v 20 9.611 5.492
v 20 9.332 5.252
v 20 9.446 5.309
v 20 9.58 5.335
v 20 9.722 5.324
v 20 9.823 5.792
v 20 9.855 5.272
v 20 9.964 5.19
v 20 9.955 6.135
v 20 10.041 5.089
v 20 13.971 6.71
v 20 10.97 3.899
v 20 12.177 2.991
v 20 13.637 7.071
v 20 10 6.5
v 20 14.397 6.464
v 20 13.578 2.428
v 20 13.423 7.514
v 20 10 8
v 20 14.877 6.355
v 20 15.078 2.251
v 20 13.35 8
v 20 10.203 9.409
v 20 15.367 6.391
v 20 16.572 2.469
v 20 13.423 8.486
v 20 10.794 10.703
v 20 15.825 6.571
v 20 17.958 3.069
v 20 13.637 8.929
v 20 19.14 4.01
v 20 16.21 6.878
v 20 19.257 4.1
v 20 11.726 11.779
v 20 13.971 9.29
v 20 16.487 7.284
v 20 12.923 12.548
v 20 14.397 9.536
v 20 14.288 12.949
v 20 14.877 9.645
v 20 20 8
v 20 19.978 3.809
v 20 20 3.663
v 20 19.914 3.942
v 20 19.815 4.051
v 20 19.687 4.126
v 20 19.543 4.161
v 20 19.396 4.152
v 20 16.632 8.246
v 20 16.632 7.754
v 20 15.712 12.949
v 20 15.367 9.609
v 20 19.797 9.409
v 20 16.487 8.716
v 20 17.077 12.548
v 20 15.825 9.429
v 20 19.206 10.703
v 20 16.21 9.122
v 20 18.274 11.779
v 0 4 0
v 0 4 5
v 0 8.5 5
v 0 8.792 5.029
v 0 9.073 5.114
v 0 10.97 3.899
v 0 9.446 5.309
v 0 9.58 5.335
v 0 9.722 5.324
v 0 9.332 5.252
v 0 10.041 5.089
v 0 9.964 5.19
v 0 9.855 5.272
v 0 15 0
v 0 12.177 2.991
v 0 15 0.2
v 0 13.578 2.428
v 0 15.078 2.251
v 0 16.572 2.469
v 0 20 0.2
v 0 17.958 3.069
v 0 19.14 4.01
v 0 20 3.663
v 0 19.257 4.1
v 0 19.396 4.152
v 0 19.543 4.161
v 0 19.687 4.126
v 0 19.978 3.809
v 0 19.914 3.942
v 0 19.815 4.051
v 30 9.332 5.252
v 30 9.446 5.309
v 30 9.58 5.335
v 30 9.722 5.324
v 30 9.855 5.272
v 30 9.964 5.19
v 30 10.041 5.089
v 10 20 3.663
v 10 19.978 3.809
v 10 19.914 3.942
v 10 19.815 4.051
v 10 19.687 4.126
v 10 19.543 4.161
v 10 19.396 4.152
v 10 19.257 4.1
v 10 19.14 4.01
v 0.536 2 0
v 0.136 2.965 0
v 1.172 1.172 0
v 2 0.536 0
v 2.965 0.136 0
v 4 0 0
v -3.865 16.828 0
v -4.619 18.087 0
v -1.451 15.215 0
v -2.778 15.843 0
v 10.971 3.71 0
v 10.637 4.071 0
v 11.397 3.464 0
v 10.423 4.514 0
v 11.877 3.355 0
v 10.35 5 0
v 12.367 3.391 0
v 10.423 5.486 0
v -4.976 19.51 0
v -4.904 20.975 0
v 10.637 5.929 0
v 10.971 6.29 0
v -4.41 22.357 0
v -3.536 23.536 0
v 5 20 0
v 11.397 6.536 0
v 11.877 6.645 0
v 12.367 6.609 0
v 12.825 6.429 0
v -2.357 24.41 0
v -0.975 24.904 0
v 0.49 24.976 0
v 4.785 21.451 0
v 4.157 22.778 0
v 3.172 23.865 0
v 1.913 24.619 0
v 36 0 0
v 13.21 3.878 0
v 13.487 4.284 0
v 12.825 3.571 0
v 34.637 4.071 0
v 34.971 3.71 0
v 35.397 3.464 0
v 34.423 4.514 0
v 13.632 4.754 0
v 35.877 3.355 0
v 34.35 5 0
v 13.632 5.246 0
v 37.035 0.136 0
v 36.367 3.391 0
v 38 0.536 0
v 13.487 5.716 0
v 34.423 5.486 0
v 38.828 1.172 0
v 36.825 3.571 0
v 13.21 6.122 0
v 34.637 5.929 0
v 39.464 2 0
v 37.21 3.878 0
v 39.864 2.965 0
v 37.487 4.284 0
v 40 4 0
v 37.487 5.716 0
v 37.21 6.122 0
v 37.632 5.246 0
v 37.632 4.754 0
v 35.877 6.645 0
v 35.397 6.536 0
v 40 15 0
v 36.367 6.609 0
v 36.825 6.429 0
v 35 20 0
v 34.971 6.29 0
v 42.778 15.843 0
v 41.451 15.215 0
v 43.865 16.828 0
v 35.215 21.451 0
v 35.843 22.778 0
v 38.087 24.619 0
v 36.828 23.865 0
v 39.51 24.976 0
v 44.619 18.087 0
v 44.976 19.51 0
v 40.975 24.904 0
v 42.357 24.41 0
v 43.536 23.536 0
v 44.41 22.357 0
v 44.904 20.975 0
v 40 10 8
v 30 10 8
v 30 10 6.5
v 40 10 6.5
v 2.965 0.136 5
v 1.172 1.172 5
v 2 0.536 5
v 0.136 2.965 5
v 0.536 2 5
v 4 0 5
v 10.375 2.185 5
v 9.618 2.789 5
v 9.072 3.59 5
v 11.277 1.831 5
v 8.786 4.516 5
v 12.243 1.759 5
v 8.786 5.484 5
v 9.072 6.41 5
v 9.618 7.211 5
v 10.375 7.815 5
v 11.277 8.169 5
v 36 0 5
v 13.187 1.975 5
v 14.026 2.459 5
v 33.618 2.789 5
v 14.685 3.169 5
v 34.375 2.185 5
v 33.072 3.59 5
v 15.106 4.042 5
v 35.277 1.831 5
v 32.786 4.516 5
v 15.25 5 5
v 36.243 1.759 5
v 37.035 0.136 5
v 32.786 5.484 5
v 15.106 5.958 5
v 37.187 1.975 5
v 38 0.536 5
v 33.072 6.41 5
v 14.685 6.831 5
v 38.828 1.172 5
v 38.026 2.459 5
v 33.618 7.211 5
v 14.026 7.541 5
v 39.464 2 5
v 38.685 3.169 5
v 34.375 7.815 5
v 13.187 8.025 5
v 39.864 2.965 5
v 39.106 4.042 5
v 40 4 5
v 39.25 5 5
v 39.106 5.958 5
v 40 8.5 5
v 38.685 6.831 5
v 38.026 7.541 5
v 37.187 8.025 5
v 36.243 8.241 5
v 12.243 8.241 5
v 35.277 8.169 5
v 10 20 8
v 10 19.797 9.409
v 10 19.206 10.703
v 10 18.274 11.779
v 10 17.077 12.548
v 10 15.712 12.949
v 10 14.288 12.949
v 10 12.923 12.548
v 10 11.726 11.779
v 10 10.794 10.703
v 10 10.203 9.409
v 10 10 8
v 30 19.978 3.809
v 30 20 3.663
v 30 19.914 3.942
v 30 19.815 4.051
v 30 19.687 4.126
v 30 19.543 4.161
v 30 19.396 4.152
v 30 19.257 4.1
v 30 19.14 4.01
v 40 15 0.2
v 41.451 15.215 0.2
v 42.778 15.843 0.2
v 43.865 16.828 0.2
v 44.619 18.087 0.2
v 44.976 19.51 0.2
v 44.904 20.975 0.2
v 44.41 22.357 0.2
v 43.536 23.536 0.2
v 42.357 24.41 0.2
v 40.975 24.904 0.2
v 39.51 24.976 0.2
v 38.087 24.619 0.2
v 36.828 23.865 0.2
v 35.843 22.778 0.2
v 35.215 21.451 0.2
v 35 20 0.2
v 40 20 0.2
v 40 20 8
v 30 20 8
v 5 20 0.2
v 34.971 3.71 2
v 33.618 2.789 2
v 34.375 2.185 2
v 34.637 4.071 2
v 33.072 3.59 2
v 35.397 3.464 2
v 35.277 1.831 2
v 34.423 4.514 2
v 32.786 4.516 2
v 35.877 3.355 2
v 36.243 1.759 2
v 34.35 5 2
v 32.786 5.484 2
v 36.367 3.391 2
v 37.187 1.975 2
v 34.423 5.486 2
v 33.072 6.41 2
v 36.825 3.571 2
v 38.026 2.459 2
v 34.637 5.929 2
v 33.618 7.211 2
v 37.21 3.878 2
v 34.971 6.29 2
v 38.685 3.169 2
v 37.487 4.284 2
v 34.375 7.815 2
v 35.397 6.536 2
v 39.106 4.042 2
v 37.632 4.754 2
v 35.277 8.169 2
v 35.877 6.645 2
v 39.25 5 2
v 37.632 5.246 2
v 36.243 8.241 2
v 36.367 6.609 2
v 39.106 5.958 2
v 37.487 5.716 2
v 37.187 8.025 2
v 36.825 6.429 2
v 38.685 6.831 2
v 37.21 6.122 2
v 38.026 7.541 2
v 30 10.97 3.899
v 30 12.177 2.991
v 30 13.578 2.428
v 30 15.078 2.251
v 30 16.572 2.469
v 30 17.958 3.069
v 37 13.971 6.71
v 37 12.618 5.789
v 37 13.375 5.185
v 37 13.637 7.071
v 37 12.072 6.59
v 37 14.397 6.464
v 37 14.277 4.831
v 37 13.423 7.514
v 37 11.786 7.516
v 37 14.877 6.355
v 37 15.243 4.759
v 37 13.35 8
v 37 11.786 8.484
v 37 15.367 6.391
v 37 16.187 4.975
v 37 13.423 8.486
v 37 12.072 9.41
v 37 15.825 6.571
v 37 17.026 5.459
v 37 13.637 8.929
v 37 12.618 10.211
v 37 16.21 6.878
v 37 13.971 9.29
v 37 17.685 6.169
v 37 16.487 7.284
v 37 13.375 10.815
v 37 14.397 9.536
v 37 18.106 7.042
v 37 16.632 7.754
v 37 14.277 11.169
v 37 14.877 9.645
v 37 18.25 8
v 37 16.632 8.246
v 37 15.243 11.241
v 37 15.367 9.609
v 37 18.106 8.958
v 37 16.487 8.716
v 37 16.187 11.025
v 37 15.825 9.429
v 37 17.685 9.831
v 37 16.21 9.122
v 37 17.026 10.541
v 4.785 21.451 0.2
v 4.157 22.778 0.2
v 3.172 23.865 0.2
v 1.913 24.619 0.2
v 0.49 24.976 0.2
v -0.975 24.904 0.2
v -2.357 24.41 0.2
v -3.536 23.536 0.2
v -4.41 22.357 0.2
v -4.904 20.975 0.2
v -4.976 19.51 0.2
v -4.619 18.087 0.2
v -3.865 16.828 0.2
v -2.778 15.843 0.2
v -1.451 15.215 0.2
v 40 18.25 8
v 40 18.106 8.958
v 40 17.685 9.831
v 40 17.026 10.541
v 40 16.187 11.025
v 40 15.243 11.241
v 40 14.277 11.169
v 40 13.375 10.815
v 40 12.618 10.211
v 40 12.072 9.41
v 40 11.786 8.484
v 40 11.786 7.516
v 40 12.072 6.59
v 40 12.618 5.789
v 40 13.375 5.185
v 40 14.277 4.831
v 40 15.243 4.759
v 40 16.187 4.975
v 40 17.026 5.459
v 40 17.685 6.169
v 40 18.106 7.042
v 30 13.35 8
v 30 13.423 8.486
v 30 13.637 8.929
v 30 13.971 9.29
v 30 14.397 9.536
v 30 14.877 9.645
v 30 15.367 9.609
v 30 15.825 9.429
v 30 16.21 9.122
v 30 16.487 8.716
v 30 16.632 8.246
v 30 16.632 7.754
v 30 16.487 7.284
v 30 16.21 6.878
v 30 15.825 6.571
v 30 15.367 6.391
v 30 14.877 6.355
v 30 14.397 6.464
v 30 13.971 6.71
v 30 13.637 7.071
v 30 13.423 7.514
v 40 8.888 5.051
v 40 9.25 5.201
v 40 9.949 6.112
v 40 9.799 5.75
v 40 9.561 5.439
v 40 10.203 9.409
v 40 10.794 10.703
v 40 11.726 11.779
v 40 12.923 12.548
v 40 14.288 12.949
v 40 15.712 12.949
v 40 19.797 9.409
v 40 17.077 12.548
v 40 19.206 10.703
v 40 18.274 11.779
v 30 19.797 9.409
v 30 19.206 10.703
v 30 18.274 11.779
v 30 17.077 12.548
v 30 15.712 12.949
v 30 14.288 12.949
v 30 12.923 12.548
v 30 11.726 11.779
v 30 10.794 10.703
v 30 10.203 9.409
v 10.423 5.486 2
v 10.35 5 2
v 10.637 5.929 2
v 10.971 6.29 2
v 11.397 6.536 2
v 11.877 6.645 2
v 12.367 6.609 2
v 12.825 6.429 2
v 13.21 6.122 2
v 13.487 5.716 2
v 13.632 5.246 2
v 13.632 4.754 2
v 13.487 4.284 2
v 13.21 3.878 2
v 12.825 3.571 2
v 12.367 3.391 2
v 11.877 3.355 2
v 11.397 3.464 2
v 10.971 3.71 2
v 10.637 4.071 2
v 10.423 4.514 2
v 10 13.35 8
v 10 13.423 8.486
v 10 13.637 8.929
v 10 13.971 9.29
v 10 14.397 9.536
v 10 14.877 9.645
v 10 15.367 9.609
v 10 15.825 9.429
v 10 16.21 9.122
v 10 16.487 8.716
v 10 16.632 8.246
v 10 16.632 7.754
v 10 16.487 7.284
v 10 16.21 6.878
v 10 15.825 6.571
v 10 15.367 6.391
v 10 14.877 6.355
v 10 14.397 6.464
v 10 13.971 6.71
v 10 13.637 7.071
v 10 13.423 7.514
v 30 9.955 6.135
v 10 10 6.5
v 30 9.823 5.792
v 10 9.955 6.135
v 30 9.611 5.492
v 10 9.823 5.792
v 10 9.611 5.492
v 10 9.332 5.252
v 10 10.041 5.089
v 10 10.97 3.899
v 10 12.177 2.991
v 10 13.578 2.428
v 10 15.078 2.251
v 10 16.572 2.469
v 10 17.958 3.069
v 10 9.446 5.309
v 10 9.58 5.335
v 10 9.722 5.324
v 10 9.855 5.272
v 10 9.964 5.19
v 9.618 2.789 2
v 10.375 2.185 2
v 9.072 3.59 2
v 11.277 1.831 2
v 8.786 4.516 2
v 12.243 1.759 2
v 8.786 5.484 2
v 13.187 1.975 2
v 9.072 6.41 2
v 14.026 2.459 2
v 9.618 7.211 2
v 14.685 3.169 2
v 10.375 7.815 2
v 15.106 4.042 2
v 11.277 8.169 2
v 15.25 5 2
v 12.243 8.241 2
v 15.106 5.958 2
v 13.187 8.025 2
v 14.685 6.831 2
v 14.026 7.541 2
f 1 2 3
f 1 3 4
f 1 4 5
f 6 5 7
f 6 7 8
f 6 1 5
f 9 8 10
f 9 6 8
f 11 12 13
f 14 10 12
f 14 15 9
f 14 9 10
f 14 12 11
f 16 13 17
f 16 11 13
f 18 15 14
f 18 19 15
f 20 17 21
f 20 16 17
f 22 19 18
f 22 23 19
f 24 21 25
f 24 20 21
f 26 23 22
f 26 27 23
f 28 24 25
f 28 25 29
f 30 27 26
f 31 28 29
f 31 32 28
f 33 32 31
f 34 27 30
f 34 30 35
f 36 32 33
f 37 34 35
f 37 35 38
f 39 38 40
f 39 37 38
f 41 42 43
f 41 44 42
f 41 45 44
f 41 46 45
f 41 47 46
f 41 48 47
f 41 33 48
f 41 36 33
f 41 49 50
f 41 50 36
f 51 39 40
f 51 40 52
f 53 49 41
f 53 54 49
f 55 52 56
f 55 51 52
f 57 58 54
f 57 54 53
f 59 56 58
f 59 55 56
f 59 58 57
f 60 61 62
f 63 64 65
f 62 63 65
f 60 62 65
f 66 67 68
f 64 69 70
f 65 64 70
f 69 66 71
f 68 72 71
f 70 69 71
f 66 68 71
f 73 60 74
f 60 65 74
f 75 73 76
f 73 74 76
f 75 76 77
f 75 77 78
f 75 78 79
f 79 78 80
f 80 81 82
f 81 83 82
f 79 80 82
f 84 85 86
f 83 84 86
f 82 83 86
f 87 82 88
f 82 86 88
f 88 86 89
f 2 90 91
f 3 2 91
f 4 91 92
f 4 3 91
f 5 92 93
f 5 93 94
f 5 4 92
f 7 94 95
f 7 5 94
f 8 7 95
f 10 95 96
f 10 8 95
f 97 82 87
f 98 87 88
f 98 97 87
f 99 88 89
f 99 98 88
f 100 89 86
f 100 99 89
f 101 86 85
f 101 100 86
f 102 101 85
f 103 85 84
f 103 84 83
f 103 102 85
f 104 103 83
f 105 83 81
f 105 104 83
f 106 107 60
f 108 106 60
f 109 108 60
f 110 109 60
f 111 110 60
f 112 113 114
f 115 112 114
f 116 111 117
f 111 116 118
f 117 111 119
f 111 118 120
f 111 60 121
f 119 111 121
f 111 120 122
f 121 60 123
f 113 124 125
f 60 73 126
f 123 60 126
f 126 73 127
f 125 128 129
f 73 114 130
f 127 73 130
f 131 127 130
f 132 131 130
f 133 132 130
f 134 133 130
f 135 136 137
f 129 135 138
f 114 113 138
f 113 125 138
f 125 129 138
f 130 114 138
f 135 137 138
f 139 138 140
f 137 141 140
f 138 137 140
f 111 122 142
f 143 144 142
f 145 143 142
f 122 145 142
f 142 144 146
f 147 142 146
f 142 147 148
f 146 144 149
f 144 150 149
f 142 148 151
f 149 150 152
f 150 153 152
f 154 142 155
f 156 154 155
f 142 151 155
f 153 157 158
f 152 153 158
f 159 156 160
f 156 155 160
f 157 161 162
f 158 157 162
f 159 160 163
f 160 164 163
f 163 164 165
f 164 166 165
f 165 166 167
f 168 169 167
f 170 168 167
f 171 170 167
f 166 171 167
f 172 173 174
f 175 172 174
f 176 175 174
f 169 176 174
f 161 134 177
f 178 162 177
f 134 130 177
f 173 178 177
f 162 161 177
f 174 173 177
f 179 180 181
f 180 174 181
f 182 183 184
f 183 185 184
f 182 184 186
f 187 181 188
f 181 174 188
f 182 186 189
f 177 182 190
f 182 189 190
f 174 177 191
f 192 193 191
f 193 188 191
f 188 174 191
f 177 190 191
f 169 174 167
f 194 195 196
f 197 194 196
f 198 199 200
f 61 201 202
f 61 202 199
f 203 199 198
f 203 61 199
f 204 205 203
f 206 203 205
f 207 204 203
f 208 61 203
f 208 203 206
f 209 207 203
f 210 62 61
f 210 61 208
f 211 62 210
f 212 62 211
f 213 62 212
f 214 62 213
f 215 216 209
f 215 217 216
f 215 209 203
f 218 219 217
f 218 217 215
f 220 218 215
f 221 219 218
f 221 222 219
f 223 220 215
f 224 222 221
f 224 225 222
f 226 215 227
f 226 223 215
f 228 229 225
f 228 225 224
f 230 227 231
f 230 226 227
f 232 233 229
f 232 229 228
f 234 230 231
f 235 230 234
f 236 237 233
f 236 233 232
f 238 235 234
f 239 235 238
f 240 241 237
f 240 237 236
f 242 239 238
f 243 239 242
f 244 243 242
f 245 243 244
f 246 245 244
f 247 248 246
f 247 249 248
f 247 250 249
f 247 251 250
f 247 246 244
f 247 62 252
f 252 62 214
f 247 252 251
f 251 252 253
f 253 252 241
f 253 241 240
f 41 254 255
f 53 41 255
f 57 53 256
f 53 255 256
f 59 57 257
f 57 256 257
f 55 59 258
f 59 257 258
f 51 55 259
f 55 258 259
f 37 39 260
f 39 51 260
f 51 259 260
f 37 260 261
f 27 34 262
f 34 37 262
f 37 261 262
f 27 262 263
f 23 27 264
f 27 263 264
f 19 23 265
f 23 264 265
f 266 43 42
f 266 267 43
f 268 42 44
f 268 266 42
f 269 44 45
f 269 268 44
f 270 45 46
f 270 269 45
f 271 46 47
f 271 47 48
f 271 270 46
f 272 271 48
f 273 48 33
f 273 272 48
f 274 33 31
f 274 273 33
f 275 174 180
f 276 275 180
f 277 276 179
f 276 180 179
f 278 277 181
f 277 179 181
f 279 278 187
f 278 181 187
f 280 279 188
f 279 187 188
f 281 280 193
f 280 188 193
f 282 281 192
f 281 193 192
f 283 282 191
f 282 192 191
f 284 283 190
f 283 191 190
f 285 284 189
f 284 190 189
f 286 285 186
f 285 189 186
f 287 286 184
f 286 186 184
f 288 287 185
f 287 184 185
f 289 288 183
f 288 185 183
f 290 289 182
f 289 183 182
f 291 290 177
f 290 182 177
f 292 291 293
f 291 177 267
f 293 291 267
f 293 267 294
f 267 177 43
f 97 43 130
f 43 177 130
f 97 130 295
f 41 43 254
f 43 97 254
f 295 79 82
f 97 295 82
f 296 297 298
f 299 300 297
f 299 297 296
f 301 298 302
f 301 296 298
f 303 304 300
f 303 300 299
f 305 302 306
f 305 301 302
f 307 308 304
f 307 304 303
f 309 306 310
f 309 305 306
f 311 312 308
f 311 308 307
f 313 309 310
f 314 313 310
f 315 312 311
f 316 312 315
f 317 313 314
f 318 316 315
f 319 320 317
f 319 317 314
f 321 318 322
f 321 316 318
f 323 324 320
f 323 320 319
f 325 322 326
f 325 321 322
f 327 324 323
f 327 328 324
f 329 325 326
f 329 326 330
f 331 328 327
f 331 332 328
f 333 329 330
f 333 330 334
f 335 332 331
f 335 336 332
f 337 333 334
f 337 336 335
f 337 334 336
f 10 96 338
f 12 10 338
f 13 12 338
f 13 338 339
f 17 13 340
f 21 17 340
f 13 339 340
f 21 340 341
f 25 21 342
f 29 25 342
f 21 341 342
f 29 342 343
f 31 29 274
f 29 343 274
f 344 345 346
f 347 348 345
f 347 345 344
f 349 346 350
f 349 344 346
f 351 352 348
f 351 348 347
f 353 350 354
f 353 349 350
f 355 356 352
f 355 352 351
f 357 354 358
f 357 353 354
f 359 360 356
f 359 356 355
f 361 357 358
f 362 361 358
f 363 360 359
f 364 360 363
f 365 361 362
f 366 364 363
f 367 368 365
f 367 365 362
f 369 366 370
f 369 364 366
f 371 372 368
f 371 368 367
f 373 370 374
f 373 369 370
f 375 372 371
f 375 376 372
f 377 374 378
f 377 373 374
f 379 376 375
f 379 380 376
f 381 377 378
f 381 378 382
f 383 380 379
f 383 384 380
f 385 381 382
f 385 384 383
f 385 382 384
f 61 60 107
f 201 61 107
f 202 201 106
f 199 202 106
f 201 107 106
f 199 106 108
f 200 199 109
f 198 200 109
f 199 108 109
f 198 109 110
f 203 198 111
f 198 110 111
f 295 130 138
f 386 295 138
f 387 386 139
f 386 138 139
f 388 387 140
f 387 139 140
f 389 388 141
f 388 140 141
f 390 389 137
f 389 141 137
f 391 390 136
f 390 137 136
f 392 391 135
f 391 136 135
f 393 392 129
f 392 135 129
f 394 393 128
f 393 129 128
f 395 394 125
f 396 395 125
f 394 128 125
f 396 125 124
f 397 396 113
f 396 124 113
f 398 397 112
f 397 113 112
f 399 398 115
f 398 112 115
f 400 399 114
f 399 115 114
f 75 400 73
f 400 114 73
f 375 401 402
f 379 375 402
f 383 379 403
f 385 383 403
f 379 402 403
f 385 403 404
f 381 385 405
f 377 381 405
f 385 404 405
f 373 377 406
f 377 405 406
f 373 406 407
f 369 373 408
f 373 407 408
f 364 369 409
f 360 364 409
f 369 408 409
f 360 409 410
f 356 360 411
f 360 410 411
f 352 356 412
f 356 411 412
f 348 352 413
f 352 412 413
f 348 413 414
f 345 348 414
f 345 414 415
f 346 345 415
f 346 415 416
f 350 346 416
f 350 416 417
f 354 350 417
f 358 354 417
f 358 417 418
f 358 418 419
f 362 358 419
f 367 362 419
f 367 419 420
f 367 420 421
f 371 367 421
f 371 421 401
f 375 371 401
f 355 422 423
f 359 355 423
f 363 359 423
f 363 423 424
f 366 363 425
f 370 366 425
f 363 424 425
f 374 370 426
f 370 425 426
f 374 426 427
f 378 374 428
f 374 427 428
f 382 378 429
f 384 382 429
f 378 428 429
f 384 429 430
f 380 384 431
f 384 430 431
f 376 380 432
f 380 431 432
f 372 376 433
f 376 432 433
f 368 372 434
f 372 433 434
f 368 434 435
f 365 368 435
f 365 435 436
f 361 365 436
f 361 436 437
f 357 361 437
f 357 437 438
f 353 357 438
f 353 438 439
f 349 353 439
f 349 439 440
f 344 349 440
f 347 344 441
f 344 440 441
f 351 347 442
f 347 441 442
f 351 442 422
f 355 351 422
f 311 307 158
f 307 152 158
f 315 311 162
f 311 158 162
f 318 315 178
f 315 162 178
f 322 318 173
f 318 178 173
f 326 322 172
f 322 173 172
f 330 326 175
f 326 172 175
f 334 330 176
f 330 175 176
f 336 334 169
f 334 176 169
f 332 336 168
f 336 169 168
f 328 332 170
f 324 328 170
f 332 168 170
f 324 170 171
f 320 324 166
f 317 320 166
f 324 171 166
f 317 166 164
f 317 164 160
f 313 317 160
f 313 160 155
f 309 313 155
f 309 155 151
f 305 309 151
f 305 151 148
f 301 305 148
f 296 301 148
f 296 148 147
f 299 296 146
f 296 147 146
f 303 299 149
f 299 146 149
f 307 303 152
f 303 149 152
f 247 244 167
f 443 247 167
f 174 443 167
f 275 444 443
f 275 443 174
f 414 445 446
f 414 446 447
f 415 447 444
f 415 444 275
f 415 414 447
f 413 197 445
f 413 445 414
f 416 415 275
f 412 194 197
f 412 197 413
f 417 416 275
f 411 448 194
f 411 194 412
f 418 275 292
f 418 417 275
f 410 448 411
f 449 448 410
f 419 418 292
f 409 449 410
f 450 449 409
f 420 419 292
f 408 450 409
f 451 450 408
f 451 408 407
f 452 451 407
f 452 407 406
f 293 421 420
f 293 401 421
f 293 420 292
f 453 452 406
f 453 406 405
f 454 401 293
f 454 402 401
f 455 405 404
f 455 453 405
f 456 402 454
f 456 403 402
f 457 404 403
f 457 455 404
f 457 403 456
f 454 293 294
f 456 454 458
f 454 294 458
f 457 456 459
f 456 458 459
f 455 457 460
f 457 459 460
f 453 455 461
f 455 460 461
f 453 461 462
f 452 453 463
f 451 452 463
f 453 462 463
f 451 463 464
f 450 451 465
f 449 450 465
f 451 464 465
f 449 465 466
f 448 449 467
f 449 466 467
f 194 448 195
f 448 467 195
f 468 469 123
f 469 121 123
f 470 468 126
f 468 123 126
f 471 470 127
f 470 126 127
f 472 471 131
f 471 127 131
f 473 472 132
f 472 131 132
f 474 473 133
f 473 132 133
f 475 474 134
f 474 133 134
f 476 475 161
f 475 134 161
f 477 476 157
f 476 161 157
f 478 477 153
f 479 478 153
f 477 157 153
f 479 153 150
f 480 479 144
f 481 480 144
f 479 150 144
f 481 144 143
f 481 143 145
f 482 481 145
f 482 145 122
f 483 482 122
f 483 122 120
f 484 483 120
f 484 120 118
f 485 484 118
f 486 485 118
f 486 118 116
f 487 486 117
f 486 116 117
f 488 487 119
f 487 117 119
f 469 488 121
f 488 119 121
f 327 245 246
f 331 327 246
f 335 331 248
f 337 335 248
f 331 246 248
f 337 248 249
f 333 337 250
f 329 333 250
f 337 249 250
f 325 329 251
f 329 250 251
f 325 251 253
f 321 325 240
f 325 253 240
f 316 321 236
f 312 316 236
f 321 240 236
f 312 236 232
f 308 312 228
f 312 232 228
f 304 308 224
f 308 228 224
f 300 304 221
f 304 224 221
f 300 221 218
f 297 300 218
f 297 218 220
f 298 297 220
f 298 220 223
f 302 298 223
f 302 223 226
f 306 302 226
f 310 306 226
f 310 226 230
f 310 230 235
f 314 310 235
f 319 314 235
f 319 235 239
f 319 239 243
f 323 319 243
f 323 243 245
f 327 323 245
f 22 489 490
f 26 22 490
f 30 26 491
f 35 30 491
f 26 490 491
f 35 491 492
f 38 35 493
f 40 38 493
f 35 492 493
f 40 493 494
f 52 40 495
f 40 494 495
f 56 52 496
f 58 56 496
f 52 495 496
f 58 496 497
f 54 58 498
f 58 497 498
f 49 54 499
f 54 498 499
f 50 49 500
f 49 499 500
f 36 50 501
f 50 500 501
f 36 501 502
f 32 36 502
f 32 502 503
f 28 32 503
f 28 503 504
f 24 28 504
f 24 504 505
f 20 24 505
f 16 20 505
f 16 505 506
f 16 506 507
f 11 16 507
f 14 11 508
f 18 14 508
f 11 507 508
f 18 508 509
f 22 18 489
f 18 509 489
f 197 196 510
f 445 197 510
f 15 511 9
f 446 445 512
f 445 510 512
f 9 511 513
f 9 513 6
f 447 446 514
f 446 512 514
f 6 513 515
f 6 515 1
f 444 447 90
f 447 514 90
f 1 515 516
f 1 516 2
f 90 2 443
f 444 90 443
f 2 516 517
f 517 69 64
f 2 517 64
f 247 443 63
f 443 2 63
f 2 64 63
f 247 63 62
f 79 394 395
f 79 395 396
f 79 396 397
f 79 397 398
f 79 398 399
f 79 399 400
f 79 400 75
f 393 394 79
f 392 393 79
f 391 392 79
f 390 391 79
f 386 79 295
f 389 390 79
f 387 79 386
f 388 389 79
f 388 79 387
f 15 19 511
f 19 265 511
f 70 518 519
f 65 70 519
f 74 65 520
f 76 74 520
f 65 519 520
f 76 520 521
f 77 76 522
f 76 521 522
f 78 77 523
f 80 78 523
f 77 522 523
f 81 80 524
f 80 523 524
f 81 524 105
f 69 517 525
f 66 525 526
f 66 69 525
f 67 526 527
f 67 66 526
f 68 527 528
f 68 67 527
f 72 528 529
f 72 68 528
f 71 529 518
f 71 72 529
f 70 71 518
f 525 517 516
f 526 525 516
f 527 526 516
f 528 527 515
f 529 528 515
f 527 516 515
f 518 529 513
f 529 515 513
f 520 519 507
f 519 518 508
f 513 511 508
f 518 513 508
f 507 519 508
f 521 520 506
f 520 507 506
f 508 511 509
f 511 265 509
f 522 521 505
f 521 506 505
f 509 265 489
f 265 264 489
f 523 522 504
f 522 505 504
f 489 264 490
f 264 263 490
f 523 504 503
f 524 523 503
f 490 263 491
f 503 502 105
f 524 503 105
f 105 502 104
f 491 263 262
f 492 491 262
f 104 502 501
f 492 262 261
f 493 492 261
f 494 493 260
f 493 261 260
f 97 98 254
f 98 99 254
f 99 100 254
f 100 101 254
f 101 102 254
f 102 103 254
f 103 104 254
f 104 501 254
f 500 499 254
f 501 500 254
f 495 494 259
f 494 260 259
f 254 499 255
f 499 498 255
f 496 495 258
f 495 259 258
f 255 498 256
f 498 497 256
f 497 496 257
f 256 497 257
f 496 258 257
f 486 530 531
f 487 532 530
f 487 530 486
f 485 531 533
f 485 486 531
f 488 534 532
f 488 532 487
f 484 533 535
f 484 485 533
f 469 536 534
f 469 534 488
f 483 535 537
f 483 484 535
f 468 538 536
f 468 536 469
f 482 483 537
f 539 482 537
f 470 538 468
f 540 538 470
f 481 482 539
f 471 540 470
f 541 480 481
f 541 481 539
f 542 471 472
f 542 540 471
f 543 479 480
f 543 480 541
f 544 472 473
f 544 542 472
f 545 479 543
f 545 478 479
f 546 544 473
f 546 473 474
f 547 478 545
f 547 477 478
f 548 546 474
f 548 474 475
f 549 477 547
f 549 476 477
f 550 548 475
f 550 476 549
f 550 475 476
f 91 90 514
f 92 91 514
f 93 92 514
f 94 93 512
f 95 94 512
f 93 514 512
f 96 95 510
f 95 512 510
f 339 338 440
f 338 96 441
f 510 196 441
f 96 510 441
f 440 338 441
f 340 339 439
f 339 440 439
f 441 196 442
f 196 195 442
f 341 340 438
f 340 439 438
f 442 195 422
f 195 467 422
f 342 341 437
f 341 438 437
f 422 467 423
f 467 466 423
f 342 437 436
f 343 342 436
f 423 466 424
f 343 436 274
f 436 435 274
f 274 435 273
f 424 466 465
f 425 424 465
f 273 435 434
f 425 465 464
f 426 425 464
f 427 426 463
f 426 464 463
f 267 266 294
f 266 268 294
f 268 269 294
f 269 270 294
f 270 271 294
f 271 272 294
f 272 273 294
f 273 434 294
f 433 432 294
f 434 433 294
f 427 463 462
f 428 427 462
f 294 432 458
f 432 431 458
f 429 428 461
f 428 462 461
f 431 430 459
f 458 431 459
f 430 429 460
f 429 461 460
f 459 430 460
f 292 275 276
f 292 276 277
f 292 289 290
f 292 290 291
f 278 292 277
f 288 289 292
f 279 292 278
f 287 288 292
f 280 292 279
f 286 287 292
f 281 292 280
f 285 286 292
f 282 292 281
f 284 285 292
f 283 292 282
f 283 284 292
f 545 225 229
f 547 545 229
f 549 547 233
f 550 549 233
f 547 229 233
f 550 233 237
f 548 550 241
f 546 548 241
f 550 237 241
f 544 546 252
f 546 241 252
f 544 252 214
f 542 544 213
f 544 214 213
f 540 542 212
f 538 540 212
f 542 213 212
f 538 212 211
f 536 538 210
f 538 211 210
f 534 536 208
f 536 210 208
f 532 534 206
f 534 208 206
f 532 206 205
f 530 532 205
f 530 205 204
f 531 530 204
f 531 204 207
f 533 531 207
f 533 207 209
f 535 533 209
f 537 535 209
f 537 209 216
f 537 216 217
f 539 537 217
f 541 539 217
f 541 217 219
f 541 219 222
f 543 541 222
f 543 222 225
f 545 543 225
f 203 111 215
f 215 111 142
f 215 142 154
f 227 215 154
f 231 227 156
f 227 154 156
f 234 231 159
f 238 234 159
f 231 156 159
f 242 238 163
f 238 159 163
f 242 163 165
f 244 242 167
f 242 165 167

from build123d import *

# Parameters (mm, degrees)
F1_DEPTH       = 5
F3_D           = 3.3
F3_CBORE_D     = 6.5
F3_CBORE_DEPTH = 3
F5_DEPTH       = 40
F6_R           = 1.5
F8_D           = 3.3
F8_CBORE_D     = 6.5
F8_CBORE_DEPTH = 3
F10_R          = 5.75
F11_DEPTH      = 10
F13_R          = 5.75
F14_DEPTH      = 10.001
F15_R          = 0.5
F16_R          = 5
F17_DEPTH      = 0.2


with BuildPart() as f1:
    # F0 (on Top) → F1 (new body)
    with BuildSketch(Plane.XY):
        with BuildLine():
            ThreePointArc((0, 4), (1.1715728753, 1.1715728753), (4, 0))
            Line((4, 0), (36, 0))
            ThreePointArc((36, 0), (38.8284271247, 1.1715728753), (40, 4))
            Line((40, 4), (40, 14))
            Line((40, 14), (0, 14))
            Line((0, 14), (0, 4))
        make_face()
    extrude(amount=F1_DEPTH)

    # F3 (through all)
    with Locations(Plane.XY.offset(5)):
        with Locations((12, 5), (36, 5)):
            CounterBoreHole(F3_D / 2, F3_CBORE_D / 2, F3_CBORE_DEPTH)

    # F4 (on Right) → F5 (join)
    with BuildSketch(Plane.YZ):
        with BuildLine():
            Line((10, 8), (10, 0))
            Line((10, 0), (20, 0))
            Line((20, 0), (20, 8))
            ThreePointArc((20, 8), (15, 13), (10, 8))
        make_face()
    extrude(amount=F5_DEPTH)

    # F6
    f6_edges = [f1.edges().sort_by_distance(p)[0] for p in [
        (20, 10, 5),
    ]]
    fillet(f6_edges, radius=F6_R)

    # F8 (through all)
    with Locations(Plane.YZ.offset(40)):
        with Locations((15, 8)):
            CounterBoreHole(F8_D / 2, F8_CBORE_D / 2, F8_CBORE_DEPTH)

    # F10 (on offset) → F11 (cut)
    with BuildSketch(Plane.YZ.offset(30)):
        with Locations((15, 8)):
            Circle(F10_R)
    extrude(amount=-F11_DEPTH, mode=Mode.SUBTRACT)

    # F13 (on offset) → F14 (cut, through all)
    with BuildSketch(Plane.YZ.offset(10)):
        with Locations((15, 8)):
            Circle(F13_R)
    extrude(amount=-F14_DEPTH, mode=Mode.SUBTRACT)

    # F15
    f15_edges = [f1.edges().sort_by_distance(p)[0] for p in [
        (5, 9.745712, 5.664415),
        (5, 20, 5.160546),
        (25, 20, 5.160546),
        (25, 9.745712, 5.664415),
    ]]
    fillet(f15_edges, radius=F15_R)

    # F16 (on Top) → F17 (join)
    with BuildSketch(Plane.XY):
        with Locations((0, 20)):
            Circle(F16_R)
        with Locations((40, 20)):
            Circle(F16_R)
    extrude(amount=F17_DEPTH)


solid = f1.part
